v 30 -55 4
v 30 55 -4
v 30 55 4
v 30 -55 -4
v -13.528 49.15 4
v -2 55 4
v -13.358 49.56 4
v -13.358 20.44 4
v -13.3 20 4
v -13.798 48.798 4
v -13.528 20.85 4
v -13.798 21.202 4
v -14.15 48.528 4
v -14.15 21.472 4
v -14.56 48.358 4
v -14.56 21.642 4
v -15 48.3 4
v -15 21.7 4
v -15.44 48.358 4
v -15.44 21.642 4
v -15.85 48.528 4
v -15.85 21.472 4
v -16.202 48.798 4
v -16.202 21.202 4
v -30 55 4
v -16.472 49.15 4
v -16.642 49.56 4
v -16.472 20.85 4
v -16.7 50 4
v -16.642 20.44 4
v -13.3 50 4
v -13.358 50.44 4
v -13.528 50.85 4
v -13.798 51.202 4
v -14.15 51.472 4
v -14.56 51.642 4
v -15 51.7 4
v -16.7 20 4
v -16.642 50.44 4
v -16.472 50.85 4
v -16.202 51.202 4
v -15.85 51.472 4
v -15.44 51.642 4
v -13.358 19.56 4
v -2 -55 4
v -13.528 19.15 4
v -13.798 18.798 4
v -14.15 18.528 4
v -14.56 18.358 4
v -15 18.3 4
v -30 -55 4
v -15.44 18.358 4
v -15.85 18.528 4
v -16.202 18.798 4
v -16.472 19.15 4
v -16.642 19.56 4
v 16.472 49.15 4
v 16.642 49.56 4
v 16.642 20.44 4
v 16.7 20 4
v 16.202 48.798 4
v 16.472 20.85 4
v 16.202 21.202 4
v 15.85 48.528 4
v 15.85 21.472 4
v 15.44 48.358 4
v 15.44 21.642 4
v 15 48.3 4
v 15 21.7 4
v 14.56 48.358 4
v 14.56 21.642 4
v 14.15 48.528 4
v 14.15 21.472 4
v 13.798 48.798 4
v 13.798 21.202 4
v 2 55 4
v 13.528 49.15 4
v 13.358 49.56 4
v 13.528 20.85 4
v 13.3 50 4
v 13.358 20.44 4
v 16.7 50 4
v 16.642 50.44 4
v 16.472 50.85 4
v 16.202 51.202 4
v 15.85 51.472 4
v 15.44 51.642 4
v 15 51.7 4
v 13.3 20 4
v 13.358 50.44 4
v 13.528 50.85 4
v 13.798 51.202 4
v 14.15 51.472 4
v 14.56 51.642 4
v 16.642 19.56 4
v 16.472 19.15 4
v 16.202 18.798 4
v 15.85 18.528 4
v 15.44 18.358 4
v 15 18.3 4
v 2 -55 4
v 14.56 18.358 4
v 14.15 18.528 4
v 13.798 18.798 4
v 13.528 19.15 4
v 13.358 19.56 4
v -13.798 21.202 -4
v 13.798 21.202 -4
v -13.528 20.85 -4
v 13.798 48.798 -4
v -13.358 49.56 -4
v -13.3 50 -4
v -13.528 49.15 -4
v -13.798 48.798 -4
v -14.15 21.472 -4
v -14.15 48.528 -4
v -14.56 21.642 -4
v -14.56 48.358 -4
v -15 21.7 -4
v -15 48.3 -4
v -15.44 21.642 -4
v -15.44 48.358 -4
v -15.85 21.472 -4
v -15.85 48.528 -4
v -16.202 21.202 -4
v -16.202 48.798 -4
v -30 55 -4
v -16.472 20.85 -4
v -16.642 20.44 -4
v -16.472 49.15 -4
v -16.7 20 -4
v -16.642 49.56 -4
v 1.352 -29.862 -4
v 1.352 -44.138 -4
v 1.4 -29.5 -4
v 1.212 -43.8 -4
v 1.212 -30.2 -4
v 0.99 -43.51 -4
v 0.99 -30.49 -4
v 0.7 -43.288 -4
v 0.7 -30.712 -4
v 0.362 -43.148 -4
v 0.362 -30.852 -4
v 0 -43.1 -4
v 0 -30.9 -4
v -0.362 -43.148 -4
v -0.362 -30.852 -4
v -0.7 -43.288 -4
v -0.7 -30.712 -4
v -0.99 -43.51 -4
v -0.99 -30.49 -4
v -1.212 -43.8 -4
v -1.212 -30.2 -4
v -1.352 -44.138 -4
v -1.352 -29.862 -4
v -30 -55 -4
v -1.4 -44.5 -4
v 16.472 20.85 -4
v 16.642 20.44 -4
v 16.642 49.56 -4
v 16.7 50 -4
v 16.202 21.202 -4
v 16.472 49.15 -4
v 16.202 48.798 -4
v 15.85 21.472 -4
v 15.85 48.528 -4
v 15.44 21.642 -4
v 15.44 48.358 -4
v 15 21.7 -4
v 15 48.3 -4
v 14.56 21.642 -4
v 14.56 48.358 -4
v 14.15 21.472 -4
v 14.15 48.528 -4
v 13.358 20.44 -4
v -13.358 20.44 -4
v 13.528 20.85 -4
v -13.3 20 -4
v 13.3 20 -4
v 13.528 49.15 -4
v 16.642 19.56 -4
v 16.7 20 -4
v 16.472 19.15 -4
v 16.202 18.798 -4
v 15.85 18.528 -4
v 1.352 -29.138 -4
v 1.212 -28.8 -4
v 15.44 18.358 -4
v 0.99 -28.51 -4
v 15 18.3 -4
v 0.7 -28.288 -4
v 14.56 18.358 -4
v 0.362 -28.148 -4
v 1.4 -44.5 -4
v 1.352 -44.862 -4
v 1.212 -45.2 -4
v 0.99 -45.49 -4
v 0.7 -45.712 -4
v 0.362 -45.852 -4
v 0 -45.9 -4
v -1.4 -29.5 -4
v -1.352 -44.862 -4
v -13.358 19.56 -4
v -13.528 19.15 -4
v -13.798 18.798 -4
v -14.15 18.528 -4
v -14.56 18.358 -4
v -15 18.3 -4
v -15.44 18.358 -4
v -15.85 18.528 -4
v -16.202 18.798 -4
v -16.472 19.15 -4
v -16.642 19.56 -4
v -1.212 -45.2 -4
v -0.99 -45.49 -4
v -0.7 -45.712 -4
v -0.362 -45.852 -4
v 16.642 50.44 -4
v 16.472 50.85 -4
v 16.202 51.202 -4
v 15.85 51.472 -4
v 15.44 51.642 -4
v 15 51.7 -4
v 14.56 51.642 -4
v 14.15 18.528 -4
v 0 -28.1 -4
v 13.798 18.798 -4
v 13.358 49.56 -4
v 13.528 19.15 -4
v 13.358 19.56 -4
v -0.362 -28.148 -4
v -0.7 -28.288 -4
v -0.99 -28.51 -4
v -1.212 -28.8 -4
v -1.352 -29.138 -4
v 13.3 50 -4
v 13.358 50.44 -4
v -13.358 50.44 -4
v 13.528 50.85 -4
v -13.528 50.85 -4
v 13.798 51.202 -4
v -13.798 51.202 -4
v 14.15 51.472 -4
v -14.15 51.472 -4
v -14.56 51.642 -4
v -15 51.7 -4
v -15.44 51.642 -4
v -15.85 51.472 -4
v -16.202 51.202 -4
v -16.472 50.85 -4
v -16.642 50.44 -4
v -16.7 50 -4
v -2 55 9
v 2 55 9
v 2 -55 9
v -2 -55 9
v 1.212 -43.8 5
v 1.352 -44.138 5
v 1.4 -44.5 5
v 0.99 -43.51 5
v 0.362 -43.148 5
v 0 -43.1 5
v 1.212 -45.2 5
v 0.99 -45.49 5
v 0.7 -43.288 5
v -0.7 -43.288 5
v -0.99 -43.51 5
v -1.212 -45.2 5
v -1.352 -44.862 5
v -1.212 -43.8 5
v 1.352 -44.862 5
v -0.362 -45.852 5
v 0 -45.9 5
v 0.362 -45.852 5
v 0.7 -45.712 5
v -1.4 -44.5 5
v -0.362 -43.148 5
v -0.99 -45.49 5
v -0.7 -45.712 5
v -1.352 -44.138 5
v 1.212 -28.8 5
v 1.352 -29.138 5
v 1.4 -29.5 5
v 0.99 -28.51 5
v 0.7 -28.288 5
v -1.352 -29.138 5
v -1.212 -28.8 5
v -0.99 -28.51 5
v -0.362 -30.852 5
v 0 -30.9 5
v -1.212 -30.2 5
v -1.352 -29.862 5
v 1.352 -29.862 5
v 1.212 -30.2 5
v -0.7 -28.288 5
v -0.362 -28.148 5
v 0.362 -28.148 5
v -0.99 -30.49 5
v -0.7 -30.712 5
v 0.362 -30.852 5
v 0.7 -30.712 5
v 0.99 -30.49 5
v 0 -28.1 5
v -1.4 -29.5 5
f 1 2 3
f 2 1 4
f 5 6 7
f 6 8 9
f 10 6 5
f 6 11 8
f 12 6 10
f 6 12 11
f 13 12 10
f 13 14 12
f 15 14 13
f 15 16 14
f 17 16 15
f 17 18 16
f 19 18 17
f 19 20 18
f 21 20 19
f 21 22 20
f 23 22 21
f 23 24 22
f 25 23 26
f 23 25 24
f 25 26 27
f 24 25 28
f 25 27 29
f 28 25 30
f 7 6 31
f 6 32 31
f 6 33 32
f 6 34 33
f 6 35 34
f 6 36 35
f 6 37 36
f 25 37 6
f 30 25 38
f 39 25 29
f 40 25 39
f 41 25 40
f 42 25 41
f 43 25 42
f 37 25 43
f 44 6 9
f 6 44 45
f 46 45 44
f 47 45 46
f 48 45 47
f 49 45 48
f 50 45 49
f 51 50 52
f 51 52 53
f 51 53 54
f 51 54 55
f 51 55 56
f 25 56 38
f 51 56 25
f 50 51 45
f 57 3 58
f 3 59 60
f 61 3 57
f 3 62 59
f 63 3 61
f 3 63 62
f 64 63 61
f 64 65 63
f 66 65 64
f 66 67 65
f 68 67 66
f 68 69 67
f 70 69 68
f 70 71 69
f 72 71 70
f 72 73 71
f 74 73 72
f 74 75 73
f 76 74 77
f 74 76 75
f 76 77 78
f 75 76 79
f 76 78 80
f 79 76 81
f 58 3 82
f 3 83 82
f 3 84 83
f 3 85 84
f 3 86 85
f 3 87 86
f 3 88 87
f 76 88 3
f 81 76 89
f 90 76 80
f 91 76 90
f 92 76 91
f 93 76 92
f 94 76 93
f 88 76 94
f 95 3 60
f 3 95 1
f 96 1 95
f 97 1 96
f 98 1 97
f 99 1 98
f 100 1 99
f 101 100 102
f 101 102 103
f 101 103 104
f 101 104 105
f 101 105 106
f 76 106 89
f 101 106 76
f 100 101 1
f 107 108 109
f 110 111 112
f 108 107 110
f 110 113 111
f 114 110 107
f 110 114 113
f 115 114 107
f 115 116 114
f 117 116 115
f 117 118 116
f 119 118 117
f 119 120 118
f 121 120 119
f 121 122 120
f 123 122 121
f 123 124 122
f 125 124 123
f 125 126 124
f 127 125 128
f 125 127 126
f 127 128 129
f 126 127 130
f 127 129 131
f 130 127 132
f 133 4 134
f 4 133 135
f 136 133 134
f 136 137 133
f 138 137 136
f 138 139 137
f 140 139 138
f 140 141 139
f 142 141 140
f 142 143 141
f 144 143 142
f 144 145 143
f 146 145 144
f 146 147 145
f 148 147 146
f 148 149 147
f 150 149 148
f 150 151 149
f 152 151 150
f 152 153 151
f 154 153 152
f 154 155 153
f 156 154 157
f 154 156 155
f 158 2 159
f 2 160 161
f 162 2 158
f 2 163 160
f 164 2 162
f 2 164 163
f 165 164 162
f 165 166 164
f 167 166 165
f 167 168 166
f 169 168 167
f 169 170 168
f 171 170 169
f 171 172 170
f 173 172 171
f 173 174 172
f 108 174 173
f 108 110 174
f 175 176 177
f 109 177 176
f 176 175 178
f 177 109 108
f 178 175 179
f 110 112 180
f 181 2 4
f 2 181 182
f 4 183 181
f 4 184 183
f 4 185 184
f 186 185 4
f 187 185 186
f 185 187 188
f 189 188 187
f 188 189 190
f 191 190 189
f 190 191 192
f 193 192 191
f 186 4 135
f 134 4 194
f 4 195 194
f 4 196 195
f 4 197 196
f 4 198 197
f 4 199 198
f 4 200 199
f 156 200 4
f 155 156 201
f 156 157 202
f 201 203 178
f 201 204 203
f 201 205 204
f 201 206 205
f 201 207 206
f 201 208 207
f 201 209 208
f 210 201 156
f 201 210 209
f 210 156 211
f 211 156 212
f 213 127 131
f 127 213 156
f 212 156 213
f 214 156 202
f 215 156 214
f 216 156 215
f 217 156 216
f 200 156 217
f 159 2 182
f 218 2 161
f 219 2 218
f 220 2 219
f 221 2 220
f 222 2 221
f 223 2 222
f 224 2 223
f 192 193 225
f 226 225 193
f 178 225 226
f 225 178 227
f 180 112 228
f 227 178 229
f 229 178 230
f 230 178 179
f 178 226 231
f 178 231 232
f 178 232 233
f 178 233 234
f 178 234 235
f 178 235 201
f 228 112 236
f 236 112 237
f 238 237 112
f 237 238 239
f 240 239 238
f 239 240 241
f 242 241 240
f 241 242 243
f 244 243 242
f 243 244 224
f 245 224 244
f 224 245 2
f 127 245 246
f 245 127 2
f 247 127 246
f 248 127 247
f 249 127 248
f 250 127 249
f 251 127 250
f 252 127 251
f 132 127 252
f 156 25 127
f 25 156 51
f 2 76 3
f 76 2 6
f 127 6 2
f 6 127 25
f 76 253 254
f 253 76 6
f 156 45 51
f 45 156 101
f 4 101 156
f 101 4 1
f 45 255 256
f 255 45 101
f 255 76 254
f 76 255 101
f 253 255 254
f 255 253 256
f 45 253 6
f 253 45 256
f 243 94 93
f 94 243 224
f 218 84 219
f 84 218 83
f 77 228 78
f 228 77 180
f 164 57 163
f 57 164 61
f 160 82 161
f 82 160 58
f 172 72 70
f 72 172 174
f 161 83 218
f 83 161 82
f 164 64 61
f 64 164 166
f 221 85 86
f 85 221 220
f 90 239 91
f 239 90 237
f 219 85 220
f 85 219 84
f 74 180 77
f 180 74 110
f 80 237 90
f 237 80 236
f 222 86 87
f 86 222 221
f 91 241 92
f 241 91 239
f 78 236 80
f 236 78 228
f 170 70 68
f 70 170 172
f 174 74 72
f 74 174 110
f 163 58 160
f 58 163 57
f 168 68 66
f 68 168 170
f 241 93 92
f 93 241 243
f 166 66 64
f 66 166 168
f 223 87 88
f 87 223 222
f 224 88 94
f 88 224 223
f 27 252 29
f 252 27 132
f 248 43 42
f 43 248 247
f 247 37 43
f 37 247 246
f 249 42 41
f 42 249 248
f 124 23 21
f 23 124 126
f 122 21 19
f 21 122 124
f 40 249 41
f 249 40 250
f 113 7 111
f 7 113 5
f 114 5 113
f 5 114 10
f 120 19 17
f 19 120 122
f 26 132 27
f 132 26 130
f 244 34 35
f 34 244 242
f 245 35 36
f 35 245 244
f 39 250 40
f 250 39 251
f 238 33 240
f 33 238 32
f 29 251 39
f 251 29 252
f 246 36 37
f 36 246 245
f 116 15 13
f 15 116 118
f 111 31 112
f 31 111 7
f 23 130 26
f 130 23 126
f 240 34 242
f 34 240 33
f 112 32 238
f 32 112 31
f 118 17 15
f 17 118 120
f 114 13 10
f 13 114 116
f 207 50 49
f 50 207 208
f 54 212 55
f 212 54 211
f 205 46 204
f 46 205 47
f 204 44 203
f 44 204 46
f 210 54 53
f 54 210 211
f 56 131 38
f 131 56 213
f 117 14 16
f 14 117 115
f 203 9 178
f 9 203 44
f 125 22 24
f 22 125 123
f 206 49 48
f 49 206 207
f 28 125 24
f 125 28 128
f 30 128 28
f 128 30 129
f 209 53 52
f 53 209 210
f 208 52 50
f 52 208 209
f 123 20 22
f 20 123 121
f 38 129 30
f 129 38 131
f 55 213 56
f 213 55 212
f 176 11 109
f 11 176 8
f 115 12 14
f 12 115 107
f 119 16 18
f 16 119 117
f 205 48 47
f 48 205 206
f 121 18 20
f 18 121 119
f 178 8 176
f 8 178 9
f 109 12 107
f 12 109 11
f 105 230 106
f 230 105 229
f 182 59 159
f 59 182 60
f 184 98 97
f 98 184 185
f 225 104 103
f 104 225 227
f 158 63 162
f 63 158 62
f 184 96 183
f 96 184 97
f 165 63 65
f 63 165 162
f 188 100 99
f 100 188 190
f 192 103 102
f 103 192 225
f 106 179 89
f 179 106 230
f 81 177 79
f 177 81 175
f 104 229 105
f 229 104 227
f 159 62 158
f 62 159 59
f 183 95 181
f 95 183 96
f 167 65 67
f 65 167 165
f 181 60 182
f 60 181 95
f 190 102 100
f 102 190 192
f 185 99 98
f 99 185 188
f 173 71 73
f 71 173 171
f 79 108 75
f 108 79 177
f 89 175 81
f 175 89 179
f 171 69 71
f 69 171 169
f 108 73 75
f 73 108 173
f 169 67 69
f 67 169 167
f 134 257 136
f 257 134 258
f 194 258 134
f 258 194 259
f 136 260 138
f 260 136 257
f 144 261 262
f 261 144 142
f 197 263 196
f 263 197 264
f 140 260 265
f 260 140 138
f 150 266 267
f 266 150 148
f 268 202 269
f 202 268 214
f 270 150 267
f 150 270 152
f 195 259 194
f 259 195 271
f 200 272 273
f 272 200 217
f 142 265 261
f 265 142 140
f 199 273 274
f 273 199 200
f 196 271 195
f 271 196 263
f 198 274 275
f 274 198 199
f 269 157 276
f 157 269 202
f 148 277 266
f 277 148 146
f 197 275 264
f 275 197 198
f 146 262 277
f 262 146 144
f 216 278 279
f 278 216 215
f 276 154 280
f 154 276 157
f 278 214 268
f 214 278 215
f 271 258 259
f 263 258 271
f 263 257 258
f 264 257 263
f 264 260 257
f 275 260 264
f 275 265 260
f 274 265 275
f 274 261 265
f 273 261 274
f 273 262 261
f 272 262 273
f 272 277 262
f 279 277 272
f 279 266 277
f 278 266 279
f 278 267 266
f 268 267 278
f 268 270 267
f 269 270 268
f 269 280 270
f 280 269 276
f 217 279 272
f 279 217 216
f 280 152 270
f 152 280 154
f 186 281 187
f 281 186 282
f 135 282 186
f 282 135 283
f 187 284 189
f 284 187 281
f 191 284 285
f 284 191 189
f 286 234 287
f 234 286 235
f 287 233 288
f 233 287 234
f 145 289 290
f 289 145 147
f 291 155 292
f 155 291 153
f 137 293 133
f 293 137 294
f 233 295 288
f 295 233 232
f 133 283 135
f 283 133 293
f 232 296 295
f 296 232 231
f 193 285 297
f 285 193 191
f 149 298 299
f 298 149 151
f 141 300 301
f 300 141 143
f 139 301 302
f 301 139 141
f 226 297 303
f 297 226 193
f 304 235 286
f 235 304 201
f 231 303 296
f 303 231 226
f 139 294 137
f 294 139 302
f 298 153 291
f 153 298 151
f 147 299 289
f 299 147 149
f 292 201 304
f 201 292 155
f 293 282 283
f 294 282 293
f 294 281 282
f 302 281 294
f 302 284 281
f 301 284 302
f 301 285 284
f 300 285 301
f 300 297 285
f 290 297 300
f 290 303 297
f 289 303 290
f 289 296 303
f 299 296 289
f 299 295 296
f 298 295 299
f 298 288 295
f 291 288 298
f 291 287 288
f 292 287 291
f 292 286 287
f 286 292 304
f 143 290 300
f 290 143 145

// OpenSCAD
// file: common.scad
// common.scad — every dimension in the feeder lives here.
// Change a value, re-run ../check.sh, and every part regrows together.

/* ---------- Printer envelope ---------- */
bed_x = 220;
bed_y = 220;
bed_z = 250;

/* ---------- Material and process ---------- */
wall      = 2.0;    // nominal wall thickness (5 perimeters at 0.4 nozzle)
fit_slide = 0.30;   // clearance for parts that must move against each other
fit_press = 0.15;   // clearance for parts pressed together
$fn       = 96;

/* ---------- Fasteners ---------- */
m3_free = 3.4;      // M3 clearance hole
m3_tap  = 2.8;      // M3 self-tapping into plastic
m4_free = 4.5;

/* ---------- Load cells (VERIFY against the cells you actually buy) ----------
   Figures below are for the common YZC-133 straight bar. Bolt spacing varies
   between suppliers; measure yours before printing the base or the platform. */
cell_l            = 80;
cell_w            = 12.7;
cell_h            = 12.7;
cell_bolt_spacing = 15;   // centre-to-centre, at each end
cell_gap          = 3;    // spacer thickness — the beam MUST be free to flex

/* ---------- Food model ---------- */
kibble_density = 0.40;   // g/cm^3, dry kibble bulk density

/* ---------- Hopper ---------- */
hopper_volume_l = 2.0;
hopper_mouth    = 140;   // inner, square, at the top
hopper_throat   = 55;    // inner, square, at the bottom

// Square frustum volume: V = h/3 * (A1 + A2 + sqrt(A1*A2))
// For squares sqrt(A1*A2) collapses to mouth*throat, so height is exact:
hopper_h = 3 * hopper_volume_l * 1000000 /
           (hopper_mouth*hopper_mouth + hopper_throat*hopper_throat +
            hopper_mouth*hopper_throat);

hopper_run        = (hopper_mouth - hopper_throat) / 2;
hopper_wall_angle = atan(hopper_h / hopper_run);   // from horizontal
hopper_taper_rate = (hopper_mouth - hopper_throat) / hopper_h;
hopper_capacity_g = hopper_volume_l * 1000 * kibble_density;

/* ---------- Drum valve ---------- */
drum_dia       = 50;
drum_len       = 60;
drum_clearance = 0.4;                      // radial
drum_bore      = drum_dia + 2*drum_clearance;
pocket_depth   = 11.3;                     // segment depth of the scoop
shaft_dia      = 6;
shaft_len      = 8;

// Circular-segment maths. OpenSCAD trig is in DEGREES; the segment area
// formula needs the angle in RADIANS, hence the two forms below.
drum_r          = drum_dia / 2;
pocket_theta    = 2 * acos(1 - pocket_depth/drum_r);        // degrees
pocket_theta_r  = pocket_theta * PI / 180;                  // radians
pocket_area     = drum_r*drum_r/2 * (pocket_theta_r - sin(pocket_theta));
pocket_volume   = pocket_area * drum_len;                   // mm^3
sweep_grams     = pocket_volume / 1000 * kibble_density;    // DERIVED, not assumed

/* ---------- Valve housing ---------- */
housing_x = drum_len + 4*wall;      // along the drum axis
housing_y = drum_bore + 4*wall;
housing_z = drum_bore + 4*wall;
outlet_x  = 45;
outlet_y  = 45;

/* ---------- Chute ---------- */
chute_forward = 70;    // how far forward of the tower the food lands
chute_drop    = 90;    // vertical fall from valve outlet to chute exit
chute_exit    = 40;
chute_clear   = 40;    // exit height above the bowl rim — impulse, not load

/* ---------- Bowl and platform ---------- */
bowl_dia     = 140;    // the BOUGHT stainless/ceramic bowl
platform_dia = 150;
platform_t   = 5;
ring_w       = 3;
ring_h       = 8;
bowl_gap     = 6;      // air on every side — the isolation gap

/* ---------- Base and tower ---------- */
base_size = 190;
base_t    = 6;
bay_h     = 28;        // electronics bay height
tower_w   = 90;
tower_d   = 70;
tower_h   = 150;

/* ---------- Head ---------- */
head_tilt   = 30;      // camera, degrees down from horizontal
cam_pcb     = [40, 40, 1.6];
sr04_dia    = 16;
sr04_pitch  = 26;      // centre-to-centre of the two transducers

/* ---------- Derived overall ---------- */
total_h = base_t + bay_h + tower_h + housing_z + hopper_h;

/* ---------- Assertions: the things that silently ruin a print ---------- */
assert(hopper_wall_angle >= 60,
       str("Hopper wall ", hopper_wall_angle, " deg is below 60 - kibble will bridge"));
assert(hopper_h + 2*wall <= bed_z,
       str("Hopper ", hopper_h, " mm exceeds bed Z ", bed_z));
assert(hopper_mouth + 2*wall <= bed_x,
       "Hopper mouth exceeds bed X");
assert(base_size <= bed_x && base_size <= bed_y,
       "Base exceeds bed footprint");
assert(platform_dia <= bed_x, "Bowl platform exceeds bed X");
assert(drum_clearance > 0, "Drum clearance must be positive or the drum seizes");
assert(drum_bore > drum_dia, "Drum bore must exceed drum diameter");
assert(pocket_depth < drum_r,
       "Pocket deeper than the drum radius - the scoop would cut through the axis");
assert(sweep_grams > 6 && sweep_grams < 10,
       str("Sweep delivers ", sweep_grams, " g - outside the 6-10 g design window"));
assert(bowl_gap > 0, "Bowl isolation gap must be positive");
assert(cell_gap > 0, "Load cell needs a flex gap or it reads nothing");
assert(chute_forward + 40 <= bed_y,
       "Bowl arm exceeds bed Y - split it or shorten chute_forward");

/* ---------- Shared geometry ---------- */
// A square frustum, bottom face on the XY plane, centred on Z.
module frustum(bottom, top, h) {
  linear_extrude(height = h, scale = top/bottom)
    square([bottom, bottom], center = true);
}

// A rectangular tube used for the labyrinth lip on the lid and hopper mouth.
module lip(inner, thickness, h) {
  difference() {
    cube([inner + 2*thickness, inner + 2*thickness, h], center = true);
    cube([inner, inner, h + 1], center = true);
  }
}

// Four bolt holes on a square pattern.
module bolt_square(spacing, dia, h) {
  for (i = [0:3])
    rotate([0, 0, 90*i])
      translate([spacing/2, spacing/2, 0])
        cylinder(d = dia, h = h, center = true, $fn = 24);
}

// The cantilever footprint a load cell bolts into: two holes plus a relief slot.
module cell_mount(dia = m3_tap, h = 10) {
  for (y = [-cell_bolt_spacing/2, cell_bolt_spacing/2])
    translate([0, y, 0]) cylinder(d = dia, h = h, center = true, $fn = 24);
}

echo(str("hopper_h = ", hopper_h, " mm"));
echo(str("hopper wall angle = ", hopper_wall_angle, " deg"));
echo(str("hopper capacity = ", hopper_capacity_g, " g"));
echo(str("sweep = ", sweep_grams, " g"));
echo(str("total height = ", total_h, " mm"));
// main file
include <common.scad>

// The base plus a forward arm would be ~260 mm in Y and will not print on a
// 220 mm bed. The arm is therefore its own part, lapped and bolted to the base.
arm_w = 60;
arm_t = base_t + 2;
lap   = 40;    // overlap onto the base, bolted through

module bowl_arm() {
  difference() {
    union() {
      cube([arm_w, chute_forward + lap, arm_t], center = true);
      // Rib for stiffness — a cantilever carrying a bowl must not sag.
      translate([0, 0, arm_t/2])
        cube([wall*2, chute_forward + lap, 10], center = true);
    }
    // Bolts through the lap into the base.
    translate([0, (chute_forward + lap)/2 - lap/2, 0])
      bolt_square(30, m3_free, arm_t + 2);
    // Load cell mount at the tip.
    translate([0, -(chute_forward + lap)/2 + cell_l*0.225, 0])
      cell_mount(m3_tap, arm_t + 2);
  }
}

bowl_arm();
